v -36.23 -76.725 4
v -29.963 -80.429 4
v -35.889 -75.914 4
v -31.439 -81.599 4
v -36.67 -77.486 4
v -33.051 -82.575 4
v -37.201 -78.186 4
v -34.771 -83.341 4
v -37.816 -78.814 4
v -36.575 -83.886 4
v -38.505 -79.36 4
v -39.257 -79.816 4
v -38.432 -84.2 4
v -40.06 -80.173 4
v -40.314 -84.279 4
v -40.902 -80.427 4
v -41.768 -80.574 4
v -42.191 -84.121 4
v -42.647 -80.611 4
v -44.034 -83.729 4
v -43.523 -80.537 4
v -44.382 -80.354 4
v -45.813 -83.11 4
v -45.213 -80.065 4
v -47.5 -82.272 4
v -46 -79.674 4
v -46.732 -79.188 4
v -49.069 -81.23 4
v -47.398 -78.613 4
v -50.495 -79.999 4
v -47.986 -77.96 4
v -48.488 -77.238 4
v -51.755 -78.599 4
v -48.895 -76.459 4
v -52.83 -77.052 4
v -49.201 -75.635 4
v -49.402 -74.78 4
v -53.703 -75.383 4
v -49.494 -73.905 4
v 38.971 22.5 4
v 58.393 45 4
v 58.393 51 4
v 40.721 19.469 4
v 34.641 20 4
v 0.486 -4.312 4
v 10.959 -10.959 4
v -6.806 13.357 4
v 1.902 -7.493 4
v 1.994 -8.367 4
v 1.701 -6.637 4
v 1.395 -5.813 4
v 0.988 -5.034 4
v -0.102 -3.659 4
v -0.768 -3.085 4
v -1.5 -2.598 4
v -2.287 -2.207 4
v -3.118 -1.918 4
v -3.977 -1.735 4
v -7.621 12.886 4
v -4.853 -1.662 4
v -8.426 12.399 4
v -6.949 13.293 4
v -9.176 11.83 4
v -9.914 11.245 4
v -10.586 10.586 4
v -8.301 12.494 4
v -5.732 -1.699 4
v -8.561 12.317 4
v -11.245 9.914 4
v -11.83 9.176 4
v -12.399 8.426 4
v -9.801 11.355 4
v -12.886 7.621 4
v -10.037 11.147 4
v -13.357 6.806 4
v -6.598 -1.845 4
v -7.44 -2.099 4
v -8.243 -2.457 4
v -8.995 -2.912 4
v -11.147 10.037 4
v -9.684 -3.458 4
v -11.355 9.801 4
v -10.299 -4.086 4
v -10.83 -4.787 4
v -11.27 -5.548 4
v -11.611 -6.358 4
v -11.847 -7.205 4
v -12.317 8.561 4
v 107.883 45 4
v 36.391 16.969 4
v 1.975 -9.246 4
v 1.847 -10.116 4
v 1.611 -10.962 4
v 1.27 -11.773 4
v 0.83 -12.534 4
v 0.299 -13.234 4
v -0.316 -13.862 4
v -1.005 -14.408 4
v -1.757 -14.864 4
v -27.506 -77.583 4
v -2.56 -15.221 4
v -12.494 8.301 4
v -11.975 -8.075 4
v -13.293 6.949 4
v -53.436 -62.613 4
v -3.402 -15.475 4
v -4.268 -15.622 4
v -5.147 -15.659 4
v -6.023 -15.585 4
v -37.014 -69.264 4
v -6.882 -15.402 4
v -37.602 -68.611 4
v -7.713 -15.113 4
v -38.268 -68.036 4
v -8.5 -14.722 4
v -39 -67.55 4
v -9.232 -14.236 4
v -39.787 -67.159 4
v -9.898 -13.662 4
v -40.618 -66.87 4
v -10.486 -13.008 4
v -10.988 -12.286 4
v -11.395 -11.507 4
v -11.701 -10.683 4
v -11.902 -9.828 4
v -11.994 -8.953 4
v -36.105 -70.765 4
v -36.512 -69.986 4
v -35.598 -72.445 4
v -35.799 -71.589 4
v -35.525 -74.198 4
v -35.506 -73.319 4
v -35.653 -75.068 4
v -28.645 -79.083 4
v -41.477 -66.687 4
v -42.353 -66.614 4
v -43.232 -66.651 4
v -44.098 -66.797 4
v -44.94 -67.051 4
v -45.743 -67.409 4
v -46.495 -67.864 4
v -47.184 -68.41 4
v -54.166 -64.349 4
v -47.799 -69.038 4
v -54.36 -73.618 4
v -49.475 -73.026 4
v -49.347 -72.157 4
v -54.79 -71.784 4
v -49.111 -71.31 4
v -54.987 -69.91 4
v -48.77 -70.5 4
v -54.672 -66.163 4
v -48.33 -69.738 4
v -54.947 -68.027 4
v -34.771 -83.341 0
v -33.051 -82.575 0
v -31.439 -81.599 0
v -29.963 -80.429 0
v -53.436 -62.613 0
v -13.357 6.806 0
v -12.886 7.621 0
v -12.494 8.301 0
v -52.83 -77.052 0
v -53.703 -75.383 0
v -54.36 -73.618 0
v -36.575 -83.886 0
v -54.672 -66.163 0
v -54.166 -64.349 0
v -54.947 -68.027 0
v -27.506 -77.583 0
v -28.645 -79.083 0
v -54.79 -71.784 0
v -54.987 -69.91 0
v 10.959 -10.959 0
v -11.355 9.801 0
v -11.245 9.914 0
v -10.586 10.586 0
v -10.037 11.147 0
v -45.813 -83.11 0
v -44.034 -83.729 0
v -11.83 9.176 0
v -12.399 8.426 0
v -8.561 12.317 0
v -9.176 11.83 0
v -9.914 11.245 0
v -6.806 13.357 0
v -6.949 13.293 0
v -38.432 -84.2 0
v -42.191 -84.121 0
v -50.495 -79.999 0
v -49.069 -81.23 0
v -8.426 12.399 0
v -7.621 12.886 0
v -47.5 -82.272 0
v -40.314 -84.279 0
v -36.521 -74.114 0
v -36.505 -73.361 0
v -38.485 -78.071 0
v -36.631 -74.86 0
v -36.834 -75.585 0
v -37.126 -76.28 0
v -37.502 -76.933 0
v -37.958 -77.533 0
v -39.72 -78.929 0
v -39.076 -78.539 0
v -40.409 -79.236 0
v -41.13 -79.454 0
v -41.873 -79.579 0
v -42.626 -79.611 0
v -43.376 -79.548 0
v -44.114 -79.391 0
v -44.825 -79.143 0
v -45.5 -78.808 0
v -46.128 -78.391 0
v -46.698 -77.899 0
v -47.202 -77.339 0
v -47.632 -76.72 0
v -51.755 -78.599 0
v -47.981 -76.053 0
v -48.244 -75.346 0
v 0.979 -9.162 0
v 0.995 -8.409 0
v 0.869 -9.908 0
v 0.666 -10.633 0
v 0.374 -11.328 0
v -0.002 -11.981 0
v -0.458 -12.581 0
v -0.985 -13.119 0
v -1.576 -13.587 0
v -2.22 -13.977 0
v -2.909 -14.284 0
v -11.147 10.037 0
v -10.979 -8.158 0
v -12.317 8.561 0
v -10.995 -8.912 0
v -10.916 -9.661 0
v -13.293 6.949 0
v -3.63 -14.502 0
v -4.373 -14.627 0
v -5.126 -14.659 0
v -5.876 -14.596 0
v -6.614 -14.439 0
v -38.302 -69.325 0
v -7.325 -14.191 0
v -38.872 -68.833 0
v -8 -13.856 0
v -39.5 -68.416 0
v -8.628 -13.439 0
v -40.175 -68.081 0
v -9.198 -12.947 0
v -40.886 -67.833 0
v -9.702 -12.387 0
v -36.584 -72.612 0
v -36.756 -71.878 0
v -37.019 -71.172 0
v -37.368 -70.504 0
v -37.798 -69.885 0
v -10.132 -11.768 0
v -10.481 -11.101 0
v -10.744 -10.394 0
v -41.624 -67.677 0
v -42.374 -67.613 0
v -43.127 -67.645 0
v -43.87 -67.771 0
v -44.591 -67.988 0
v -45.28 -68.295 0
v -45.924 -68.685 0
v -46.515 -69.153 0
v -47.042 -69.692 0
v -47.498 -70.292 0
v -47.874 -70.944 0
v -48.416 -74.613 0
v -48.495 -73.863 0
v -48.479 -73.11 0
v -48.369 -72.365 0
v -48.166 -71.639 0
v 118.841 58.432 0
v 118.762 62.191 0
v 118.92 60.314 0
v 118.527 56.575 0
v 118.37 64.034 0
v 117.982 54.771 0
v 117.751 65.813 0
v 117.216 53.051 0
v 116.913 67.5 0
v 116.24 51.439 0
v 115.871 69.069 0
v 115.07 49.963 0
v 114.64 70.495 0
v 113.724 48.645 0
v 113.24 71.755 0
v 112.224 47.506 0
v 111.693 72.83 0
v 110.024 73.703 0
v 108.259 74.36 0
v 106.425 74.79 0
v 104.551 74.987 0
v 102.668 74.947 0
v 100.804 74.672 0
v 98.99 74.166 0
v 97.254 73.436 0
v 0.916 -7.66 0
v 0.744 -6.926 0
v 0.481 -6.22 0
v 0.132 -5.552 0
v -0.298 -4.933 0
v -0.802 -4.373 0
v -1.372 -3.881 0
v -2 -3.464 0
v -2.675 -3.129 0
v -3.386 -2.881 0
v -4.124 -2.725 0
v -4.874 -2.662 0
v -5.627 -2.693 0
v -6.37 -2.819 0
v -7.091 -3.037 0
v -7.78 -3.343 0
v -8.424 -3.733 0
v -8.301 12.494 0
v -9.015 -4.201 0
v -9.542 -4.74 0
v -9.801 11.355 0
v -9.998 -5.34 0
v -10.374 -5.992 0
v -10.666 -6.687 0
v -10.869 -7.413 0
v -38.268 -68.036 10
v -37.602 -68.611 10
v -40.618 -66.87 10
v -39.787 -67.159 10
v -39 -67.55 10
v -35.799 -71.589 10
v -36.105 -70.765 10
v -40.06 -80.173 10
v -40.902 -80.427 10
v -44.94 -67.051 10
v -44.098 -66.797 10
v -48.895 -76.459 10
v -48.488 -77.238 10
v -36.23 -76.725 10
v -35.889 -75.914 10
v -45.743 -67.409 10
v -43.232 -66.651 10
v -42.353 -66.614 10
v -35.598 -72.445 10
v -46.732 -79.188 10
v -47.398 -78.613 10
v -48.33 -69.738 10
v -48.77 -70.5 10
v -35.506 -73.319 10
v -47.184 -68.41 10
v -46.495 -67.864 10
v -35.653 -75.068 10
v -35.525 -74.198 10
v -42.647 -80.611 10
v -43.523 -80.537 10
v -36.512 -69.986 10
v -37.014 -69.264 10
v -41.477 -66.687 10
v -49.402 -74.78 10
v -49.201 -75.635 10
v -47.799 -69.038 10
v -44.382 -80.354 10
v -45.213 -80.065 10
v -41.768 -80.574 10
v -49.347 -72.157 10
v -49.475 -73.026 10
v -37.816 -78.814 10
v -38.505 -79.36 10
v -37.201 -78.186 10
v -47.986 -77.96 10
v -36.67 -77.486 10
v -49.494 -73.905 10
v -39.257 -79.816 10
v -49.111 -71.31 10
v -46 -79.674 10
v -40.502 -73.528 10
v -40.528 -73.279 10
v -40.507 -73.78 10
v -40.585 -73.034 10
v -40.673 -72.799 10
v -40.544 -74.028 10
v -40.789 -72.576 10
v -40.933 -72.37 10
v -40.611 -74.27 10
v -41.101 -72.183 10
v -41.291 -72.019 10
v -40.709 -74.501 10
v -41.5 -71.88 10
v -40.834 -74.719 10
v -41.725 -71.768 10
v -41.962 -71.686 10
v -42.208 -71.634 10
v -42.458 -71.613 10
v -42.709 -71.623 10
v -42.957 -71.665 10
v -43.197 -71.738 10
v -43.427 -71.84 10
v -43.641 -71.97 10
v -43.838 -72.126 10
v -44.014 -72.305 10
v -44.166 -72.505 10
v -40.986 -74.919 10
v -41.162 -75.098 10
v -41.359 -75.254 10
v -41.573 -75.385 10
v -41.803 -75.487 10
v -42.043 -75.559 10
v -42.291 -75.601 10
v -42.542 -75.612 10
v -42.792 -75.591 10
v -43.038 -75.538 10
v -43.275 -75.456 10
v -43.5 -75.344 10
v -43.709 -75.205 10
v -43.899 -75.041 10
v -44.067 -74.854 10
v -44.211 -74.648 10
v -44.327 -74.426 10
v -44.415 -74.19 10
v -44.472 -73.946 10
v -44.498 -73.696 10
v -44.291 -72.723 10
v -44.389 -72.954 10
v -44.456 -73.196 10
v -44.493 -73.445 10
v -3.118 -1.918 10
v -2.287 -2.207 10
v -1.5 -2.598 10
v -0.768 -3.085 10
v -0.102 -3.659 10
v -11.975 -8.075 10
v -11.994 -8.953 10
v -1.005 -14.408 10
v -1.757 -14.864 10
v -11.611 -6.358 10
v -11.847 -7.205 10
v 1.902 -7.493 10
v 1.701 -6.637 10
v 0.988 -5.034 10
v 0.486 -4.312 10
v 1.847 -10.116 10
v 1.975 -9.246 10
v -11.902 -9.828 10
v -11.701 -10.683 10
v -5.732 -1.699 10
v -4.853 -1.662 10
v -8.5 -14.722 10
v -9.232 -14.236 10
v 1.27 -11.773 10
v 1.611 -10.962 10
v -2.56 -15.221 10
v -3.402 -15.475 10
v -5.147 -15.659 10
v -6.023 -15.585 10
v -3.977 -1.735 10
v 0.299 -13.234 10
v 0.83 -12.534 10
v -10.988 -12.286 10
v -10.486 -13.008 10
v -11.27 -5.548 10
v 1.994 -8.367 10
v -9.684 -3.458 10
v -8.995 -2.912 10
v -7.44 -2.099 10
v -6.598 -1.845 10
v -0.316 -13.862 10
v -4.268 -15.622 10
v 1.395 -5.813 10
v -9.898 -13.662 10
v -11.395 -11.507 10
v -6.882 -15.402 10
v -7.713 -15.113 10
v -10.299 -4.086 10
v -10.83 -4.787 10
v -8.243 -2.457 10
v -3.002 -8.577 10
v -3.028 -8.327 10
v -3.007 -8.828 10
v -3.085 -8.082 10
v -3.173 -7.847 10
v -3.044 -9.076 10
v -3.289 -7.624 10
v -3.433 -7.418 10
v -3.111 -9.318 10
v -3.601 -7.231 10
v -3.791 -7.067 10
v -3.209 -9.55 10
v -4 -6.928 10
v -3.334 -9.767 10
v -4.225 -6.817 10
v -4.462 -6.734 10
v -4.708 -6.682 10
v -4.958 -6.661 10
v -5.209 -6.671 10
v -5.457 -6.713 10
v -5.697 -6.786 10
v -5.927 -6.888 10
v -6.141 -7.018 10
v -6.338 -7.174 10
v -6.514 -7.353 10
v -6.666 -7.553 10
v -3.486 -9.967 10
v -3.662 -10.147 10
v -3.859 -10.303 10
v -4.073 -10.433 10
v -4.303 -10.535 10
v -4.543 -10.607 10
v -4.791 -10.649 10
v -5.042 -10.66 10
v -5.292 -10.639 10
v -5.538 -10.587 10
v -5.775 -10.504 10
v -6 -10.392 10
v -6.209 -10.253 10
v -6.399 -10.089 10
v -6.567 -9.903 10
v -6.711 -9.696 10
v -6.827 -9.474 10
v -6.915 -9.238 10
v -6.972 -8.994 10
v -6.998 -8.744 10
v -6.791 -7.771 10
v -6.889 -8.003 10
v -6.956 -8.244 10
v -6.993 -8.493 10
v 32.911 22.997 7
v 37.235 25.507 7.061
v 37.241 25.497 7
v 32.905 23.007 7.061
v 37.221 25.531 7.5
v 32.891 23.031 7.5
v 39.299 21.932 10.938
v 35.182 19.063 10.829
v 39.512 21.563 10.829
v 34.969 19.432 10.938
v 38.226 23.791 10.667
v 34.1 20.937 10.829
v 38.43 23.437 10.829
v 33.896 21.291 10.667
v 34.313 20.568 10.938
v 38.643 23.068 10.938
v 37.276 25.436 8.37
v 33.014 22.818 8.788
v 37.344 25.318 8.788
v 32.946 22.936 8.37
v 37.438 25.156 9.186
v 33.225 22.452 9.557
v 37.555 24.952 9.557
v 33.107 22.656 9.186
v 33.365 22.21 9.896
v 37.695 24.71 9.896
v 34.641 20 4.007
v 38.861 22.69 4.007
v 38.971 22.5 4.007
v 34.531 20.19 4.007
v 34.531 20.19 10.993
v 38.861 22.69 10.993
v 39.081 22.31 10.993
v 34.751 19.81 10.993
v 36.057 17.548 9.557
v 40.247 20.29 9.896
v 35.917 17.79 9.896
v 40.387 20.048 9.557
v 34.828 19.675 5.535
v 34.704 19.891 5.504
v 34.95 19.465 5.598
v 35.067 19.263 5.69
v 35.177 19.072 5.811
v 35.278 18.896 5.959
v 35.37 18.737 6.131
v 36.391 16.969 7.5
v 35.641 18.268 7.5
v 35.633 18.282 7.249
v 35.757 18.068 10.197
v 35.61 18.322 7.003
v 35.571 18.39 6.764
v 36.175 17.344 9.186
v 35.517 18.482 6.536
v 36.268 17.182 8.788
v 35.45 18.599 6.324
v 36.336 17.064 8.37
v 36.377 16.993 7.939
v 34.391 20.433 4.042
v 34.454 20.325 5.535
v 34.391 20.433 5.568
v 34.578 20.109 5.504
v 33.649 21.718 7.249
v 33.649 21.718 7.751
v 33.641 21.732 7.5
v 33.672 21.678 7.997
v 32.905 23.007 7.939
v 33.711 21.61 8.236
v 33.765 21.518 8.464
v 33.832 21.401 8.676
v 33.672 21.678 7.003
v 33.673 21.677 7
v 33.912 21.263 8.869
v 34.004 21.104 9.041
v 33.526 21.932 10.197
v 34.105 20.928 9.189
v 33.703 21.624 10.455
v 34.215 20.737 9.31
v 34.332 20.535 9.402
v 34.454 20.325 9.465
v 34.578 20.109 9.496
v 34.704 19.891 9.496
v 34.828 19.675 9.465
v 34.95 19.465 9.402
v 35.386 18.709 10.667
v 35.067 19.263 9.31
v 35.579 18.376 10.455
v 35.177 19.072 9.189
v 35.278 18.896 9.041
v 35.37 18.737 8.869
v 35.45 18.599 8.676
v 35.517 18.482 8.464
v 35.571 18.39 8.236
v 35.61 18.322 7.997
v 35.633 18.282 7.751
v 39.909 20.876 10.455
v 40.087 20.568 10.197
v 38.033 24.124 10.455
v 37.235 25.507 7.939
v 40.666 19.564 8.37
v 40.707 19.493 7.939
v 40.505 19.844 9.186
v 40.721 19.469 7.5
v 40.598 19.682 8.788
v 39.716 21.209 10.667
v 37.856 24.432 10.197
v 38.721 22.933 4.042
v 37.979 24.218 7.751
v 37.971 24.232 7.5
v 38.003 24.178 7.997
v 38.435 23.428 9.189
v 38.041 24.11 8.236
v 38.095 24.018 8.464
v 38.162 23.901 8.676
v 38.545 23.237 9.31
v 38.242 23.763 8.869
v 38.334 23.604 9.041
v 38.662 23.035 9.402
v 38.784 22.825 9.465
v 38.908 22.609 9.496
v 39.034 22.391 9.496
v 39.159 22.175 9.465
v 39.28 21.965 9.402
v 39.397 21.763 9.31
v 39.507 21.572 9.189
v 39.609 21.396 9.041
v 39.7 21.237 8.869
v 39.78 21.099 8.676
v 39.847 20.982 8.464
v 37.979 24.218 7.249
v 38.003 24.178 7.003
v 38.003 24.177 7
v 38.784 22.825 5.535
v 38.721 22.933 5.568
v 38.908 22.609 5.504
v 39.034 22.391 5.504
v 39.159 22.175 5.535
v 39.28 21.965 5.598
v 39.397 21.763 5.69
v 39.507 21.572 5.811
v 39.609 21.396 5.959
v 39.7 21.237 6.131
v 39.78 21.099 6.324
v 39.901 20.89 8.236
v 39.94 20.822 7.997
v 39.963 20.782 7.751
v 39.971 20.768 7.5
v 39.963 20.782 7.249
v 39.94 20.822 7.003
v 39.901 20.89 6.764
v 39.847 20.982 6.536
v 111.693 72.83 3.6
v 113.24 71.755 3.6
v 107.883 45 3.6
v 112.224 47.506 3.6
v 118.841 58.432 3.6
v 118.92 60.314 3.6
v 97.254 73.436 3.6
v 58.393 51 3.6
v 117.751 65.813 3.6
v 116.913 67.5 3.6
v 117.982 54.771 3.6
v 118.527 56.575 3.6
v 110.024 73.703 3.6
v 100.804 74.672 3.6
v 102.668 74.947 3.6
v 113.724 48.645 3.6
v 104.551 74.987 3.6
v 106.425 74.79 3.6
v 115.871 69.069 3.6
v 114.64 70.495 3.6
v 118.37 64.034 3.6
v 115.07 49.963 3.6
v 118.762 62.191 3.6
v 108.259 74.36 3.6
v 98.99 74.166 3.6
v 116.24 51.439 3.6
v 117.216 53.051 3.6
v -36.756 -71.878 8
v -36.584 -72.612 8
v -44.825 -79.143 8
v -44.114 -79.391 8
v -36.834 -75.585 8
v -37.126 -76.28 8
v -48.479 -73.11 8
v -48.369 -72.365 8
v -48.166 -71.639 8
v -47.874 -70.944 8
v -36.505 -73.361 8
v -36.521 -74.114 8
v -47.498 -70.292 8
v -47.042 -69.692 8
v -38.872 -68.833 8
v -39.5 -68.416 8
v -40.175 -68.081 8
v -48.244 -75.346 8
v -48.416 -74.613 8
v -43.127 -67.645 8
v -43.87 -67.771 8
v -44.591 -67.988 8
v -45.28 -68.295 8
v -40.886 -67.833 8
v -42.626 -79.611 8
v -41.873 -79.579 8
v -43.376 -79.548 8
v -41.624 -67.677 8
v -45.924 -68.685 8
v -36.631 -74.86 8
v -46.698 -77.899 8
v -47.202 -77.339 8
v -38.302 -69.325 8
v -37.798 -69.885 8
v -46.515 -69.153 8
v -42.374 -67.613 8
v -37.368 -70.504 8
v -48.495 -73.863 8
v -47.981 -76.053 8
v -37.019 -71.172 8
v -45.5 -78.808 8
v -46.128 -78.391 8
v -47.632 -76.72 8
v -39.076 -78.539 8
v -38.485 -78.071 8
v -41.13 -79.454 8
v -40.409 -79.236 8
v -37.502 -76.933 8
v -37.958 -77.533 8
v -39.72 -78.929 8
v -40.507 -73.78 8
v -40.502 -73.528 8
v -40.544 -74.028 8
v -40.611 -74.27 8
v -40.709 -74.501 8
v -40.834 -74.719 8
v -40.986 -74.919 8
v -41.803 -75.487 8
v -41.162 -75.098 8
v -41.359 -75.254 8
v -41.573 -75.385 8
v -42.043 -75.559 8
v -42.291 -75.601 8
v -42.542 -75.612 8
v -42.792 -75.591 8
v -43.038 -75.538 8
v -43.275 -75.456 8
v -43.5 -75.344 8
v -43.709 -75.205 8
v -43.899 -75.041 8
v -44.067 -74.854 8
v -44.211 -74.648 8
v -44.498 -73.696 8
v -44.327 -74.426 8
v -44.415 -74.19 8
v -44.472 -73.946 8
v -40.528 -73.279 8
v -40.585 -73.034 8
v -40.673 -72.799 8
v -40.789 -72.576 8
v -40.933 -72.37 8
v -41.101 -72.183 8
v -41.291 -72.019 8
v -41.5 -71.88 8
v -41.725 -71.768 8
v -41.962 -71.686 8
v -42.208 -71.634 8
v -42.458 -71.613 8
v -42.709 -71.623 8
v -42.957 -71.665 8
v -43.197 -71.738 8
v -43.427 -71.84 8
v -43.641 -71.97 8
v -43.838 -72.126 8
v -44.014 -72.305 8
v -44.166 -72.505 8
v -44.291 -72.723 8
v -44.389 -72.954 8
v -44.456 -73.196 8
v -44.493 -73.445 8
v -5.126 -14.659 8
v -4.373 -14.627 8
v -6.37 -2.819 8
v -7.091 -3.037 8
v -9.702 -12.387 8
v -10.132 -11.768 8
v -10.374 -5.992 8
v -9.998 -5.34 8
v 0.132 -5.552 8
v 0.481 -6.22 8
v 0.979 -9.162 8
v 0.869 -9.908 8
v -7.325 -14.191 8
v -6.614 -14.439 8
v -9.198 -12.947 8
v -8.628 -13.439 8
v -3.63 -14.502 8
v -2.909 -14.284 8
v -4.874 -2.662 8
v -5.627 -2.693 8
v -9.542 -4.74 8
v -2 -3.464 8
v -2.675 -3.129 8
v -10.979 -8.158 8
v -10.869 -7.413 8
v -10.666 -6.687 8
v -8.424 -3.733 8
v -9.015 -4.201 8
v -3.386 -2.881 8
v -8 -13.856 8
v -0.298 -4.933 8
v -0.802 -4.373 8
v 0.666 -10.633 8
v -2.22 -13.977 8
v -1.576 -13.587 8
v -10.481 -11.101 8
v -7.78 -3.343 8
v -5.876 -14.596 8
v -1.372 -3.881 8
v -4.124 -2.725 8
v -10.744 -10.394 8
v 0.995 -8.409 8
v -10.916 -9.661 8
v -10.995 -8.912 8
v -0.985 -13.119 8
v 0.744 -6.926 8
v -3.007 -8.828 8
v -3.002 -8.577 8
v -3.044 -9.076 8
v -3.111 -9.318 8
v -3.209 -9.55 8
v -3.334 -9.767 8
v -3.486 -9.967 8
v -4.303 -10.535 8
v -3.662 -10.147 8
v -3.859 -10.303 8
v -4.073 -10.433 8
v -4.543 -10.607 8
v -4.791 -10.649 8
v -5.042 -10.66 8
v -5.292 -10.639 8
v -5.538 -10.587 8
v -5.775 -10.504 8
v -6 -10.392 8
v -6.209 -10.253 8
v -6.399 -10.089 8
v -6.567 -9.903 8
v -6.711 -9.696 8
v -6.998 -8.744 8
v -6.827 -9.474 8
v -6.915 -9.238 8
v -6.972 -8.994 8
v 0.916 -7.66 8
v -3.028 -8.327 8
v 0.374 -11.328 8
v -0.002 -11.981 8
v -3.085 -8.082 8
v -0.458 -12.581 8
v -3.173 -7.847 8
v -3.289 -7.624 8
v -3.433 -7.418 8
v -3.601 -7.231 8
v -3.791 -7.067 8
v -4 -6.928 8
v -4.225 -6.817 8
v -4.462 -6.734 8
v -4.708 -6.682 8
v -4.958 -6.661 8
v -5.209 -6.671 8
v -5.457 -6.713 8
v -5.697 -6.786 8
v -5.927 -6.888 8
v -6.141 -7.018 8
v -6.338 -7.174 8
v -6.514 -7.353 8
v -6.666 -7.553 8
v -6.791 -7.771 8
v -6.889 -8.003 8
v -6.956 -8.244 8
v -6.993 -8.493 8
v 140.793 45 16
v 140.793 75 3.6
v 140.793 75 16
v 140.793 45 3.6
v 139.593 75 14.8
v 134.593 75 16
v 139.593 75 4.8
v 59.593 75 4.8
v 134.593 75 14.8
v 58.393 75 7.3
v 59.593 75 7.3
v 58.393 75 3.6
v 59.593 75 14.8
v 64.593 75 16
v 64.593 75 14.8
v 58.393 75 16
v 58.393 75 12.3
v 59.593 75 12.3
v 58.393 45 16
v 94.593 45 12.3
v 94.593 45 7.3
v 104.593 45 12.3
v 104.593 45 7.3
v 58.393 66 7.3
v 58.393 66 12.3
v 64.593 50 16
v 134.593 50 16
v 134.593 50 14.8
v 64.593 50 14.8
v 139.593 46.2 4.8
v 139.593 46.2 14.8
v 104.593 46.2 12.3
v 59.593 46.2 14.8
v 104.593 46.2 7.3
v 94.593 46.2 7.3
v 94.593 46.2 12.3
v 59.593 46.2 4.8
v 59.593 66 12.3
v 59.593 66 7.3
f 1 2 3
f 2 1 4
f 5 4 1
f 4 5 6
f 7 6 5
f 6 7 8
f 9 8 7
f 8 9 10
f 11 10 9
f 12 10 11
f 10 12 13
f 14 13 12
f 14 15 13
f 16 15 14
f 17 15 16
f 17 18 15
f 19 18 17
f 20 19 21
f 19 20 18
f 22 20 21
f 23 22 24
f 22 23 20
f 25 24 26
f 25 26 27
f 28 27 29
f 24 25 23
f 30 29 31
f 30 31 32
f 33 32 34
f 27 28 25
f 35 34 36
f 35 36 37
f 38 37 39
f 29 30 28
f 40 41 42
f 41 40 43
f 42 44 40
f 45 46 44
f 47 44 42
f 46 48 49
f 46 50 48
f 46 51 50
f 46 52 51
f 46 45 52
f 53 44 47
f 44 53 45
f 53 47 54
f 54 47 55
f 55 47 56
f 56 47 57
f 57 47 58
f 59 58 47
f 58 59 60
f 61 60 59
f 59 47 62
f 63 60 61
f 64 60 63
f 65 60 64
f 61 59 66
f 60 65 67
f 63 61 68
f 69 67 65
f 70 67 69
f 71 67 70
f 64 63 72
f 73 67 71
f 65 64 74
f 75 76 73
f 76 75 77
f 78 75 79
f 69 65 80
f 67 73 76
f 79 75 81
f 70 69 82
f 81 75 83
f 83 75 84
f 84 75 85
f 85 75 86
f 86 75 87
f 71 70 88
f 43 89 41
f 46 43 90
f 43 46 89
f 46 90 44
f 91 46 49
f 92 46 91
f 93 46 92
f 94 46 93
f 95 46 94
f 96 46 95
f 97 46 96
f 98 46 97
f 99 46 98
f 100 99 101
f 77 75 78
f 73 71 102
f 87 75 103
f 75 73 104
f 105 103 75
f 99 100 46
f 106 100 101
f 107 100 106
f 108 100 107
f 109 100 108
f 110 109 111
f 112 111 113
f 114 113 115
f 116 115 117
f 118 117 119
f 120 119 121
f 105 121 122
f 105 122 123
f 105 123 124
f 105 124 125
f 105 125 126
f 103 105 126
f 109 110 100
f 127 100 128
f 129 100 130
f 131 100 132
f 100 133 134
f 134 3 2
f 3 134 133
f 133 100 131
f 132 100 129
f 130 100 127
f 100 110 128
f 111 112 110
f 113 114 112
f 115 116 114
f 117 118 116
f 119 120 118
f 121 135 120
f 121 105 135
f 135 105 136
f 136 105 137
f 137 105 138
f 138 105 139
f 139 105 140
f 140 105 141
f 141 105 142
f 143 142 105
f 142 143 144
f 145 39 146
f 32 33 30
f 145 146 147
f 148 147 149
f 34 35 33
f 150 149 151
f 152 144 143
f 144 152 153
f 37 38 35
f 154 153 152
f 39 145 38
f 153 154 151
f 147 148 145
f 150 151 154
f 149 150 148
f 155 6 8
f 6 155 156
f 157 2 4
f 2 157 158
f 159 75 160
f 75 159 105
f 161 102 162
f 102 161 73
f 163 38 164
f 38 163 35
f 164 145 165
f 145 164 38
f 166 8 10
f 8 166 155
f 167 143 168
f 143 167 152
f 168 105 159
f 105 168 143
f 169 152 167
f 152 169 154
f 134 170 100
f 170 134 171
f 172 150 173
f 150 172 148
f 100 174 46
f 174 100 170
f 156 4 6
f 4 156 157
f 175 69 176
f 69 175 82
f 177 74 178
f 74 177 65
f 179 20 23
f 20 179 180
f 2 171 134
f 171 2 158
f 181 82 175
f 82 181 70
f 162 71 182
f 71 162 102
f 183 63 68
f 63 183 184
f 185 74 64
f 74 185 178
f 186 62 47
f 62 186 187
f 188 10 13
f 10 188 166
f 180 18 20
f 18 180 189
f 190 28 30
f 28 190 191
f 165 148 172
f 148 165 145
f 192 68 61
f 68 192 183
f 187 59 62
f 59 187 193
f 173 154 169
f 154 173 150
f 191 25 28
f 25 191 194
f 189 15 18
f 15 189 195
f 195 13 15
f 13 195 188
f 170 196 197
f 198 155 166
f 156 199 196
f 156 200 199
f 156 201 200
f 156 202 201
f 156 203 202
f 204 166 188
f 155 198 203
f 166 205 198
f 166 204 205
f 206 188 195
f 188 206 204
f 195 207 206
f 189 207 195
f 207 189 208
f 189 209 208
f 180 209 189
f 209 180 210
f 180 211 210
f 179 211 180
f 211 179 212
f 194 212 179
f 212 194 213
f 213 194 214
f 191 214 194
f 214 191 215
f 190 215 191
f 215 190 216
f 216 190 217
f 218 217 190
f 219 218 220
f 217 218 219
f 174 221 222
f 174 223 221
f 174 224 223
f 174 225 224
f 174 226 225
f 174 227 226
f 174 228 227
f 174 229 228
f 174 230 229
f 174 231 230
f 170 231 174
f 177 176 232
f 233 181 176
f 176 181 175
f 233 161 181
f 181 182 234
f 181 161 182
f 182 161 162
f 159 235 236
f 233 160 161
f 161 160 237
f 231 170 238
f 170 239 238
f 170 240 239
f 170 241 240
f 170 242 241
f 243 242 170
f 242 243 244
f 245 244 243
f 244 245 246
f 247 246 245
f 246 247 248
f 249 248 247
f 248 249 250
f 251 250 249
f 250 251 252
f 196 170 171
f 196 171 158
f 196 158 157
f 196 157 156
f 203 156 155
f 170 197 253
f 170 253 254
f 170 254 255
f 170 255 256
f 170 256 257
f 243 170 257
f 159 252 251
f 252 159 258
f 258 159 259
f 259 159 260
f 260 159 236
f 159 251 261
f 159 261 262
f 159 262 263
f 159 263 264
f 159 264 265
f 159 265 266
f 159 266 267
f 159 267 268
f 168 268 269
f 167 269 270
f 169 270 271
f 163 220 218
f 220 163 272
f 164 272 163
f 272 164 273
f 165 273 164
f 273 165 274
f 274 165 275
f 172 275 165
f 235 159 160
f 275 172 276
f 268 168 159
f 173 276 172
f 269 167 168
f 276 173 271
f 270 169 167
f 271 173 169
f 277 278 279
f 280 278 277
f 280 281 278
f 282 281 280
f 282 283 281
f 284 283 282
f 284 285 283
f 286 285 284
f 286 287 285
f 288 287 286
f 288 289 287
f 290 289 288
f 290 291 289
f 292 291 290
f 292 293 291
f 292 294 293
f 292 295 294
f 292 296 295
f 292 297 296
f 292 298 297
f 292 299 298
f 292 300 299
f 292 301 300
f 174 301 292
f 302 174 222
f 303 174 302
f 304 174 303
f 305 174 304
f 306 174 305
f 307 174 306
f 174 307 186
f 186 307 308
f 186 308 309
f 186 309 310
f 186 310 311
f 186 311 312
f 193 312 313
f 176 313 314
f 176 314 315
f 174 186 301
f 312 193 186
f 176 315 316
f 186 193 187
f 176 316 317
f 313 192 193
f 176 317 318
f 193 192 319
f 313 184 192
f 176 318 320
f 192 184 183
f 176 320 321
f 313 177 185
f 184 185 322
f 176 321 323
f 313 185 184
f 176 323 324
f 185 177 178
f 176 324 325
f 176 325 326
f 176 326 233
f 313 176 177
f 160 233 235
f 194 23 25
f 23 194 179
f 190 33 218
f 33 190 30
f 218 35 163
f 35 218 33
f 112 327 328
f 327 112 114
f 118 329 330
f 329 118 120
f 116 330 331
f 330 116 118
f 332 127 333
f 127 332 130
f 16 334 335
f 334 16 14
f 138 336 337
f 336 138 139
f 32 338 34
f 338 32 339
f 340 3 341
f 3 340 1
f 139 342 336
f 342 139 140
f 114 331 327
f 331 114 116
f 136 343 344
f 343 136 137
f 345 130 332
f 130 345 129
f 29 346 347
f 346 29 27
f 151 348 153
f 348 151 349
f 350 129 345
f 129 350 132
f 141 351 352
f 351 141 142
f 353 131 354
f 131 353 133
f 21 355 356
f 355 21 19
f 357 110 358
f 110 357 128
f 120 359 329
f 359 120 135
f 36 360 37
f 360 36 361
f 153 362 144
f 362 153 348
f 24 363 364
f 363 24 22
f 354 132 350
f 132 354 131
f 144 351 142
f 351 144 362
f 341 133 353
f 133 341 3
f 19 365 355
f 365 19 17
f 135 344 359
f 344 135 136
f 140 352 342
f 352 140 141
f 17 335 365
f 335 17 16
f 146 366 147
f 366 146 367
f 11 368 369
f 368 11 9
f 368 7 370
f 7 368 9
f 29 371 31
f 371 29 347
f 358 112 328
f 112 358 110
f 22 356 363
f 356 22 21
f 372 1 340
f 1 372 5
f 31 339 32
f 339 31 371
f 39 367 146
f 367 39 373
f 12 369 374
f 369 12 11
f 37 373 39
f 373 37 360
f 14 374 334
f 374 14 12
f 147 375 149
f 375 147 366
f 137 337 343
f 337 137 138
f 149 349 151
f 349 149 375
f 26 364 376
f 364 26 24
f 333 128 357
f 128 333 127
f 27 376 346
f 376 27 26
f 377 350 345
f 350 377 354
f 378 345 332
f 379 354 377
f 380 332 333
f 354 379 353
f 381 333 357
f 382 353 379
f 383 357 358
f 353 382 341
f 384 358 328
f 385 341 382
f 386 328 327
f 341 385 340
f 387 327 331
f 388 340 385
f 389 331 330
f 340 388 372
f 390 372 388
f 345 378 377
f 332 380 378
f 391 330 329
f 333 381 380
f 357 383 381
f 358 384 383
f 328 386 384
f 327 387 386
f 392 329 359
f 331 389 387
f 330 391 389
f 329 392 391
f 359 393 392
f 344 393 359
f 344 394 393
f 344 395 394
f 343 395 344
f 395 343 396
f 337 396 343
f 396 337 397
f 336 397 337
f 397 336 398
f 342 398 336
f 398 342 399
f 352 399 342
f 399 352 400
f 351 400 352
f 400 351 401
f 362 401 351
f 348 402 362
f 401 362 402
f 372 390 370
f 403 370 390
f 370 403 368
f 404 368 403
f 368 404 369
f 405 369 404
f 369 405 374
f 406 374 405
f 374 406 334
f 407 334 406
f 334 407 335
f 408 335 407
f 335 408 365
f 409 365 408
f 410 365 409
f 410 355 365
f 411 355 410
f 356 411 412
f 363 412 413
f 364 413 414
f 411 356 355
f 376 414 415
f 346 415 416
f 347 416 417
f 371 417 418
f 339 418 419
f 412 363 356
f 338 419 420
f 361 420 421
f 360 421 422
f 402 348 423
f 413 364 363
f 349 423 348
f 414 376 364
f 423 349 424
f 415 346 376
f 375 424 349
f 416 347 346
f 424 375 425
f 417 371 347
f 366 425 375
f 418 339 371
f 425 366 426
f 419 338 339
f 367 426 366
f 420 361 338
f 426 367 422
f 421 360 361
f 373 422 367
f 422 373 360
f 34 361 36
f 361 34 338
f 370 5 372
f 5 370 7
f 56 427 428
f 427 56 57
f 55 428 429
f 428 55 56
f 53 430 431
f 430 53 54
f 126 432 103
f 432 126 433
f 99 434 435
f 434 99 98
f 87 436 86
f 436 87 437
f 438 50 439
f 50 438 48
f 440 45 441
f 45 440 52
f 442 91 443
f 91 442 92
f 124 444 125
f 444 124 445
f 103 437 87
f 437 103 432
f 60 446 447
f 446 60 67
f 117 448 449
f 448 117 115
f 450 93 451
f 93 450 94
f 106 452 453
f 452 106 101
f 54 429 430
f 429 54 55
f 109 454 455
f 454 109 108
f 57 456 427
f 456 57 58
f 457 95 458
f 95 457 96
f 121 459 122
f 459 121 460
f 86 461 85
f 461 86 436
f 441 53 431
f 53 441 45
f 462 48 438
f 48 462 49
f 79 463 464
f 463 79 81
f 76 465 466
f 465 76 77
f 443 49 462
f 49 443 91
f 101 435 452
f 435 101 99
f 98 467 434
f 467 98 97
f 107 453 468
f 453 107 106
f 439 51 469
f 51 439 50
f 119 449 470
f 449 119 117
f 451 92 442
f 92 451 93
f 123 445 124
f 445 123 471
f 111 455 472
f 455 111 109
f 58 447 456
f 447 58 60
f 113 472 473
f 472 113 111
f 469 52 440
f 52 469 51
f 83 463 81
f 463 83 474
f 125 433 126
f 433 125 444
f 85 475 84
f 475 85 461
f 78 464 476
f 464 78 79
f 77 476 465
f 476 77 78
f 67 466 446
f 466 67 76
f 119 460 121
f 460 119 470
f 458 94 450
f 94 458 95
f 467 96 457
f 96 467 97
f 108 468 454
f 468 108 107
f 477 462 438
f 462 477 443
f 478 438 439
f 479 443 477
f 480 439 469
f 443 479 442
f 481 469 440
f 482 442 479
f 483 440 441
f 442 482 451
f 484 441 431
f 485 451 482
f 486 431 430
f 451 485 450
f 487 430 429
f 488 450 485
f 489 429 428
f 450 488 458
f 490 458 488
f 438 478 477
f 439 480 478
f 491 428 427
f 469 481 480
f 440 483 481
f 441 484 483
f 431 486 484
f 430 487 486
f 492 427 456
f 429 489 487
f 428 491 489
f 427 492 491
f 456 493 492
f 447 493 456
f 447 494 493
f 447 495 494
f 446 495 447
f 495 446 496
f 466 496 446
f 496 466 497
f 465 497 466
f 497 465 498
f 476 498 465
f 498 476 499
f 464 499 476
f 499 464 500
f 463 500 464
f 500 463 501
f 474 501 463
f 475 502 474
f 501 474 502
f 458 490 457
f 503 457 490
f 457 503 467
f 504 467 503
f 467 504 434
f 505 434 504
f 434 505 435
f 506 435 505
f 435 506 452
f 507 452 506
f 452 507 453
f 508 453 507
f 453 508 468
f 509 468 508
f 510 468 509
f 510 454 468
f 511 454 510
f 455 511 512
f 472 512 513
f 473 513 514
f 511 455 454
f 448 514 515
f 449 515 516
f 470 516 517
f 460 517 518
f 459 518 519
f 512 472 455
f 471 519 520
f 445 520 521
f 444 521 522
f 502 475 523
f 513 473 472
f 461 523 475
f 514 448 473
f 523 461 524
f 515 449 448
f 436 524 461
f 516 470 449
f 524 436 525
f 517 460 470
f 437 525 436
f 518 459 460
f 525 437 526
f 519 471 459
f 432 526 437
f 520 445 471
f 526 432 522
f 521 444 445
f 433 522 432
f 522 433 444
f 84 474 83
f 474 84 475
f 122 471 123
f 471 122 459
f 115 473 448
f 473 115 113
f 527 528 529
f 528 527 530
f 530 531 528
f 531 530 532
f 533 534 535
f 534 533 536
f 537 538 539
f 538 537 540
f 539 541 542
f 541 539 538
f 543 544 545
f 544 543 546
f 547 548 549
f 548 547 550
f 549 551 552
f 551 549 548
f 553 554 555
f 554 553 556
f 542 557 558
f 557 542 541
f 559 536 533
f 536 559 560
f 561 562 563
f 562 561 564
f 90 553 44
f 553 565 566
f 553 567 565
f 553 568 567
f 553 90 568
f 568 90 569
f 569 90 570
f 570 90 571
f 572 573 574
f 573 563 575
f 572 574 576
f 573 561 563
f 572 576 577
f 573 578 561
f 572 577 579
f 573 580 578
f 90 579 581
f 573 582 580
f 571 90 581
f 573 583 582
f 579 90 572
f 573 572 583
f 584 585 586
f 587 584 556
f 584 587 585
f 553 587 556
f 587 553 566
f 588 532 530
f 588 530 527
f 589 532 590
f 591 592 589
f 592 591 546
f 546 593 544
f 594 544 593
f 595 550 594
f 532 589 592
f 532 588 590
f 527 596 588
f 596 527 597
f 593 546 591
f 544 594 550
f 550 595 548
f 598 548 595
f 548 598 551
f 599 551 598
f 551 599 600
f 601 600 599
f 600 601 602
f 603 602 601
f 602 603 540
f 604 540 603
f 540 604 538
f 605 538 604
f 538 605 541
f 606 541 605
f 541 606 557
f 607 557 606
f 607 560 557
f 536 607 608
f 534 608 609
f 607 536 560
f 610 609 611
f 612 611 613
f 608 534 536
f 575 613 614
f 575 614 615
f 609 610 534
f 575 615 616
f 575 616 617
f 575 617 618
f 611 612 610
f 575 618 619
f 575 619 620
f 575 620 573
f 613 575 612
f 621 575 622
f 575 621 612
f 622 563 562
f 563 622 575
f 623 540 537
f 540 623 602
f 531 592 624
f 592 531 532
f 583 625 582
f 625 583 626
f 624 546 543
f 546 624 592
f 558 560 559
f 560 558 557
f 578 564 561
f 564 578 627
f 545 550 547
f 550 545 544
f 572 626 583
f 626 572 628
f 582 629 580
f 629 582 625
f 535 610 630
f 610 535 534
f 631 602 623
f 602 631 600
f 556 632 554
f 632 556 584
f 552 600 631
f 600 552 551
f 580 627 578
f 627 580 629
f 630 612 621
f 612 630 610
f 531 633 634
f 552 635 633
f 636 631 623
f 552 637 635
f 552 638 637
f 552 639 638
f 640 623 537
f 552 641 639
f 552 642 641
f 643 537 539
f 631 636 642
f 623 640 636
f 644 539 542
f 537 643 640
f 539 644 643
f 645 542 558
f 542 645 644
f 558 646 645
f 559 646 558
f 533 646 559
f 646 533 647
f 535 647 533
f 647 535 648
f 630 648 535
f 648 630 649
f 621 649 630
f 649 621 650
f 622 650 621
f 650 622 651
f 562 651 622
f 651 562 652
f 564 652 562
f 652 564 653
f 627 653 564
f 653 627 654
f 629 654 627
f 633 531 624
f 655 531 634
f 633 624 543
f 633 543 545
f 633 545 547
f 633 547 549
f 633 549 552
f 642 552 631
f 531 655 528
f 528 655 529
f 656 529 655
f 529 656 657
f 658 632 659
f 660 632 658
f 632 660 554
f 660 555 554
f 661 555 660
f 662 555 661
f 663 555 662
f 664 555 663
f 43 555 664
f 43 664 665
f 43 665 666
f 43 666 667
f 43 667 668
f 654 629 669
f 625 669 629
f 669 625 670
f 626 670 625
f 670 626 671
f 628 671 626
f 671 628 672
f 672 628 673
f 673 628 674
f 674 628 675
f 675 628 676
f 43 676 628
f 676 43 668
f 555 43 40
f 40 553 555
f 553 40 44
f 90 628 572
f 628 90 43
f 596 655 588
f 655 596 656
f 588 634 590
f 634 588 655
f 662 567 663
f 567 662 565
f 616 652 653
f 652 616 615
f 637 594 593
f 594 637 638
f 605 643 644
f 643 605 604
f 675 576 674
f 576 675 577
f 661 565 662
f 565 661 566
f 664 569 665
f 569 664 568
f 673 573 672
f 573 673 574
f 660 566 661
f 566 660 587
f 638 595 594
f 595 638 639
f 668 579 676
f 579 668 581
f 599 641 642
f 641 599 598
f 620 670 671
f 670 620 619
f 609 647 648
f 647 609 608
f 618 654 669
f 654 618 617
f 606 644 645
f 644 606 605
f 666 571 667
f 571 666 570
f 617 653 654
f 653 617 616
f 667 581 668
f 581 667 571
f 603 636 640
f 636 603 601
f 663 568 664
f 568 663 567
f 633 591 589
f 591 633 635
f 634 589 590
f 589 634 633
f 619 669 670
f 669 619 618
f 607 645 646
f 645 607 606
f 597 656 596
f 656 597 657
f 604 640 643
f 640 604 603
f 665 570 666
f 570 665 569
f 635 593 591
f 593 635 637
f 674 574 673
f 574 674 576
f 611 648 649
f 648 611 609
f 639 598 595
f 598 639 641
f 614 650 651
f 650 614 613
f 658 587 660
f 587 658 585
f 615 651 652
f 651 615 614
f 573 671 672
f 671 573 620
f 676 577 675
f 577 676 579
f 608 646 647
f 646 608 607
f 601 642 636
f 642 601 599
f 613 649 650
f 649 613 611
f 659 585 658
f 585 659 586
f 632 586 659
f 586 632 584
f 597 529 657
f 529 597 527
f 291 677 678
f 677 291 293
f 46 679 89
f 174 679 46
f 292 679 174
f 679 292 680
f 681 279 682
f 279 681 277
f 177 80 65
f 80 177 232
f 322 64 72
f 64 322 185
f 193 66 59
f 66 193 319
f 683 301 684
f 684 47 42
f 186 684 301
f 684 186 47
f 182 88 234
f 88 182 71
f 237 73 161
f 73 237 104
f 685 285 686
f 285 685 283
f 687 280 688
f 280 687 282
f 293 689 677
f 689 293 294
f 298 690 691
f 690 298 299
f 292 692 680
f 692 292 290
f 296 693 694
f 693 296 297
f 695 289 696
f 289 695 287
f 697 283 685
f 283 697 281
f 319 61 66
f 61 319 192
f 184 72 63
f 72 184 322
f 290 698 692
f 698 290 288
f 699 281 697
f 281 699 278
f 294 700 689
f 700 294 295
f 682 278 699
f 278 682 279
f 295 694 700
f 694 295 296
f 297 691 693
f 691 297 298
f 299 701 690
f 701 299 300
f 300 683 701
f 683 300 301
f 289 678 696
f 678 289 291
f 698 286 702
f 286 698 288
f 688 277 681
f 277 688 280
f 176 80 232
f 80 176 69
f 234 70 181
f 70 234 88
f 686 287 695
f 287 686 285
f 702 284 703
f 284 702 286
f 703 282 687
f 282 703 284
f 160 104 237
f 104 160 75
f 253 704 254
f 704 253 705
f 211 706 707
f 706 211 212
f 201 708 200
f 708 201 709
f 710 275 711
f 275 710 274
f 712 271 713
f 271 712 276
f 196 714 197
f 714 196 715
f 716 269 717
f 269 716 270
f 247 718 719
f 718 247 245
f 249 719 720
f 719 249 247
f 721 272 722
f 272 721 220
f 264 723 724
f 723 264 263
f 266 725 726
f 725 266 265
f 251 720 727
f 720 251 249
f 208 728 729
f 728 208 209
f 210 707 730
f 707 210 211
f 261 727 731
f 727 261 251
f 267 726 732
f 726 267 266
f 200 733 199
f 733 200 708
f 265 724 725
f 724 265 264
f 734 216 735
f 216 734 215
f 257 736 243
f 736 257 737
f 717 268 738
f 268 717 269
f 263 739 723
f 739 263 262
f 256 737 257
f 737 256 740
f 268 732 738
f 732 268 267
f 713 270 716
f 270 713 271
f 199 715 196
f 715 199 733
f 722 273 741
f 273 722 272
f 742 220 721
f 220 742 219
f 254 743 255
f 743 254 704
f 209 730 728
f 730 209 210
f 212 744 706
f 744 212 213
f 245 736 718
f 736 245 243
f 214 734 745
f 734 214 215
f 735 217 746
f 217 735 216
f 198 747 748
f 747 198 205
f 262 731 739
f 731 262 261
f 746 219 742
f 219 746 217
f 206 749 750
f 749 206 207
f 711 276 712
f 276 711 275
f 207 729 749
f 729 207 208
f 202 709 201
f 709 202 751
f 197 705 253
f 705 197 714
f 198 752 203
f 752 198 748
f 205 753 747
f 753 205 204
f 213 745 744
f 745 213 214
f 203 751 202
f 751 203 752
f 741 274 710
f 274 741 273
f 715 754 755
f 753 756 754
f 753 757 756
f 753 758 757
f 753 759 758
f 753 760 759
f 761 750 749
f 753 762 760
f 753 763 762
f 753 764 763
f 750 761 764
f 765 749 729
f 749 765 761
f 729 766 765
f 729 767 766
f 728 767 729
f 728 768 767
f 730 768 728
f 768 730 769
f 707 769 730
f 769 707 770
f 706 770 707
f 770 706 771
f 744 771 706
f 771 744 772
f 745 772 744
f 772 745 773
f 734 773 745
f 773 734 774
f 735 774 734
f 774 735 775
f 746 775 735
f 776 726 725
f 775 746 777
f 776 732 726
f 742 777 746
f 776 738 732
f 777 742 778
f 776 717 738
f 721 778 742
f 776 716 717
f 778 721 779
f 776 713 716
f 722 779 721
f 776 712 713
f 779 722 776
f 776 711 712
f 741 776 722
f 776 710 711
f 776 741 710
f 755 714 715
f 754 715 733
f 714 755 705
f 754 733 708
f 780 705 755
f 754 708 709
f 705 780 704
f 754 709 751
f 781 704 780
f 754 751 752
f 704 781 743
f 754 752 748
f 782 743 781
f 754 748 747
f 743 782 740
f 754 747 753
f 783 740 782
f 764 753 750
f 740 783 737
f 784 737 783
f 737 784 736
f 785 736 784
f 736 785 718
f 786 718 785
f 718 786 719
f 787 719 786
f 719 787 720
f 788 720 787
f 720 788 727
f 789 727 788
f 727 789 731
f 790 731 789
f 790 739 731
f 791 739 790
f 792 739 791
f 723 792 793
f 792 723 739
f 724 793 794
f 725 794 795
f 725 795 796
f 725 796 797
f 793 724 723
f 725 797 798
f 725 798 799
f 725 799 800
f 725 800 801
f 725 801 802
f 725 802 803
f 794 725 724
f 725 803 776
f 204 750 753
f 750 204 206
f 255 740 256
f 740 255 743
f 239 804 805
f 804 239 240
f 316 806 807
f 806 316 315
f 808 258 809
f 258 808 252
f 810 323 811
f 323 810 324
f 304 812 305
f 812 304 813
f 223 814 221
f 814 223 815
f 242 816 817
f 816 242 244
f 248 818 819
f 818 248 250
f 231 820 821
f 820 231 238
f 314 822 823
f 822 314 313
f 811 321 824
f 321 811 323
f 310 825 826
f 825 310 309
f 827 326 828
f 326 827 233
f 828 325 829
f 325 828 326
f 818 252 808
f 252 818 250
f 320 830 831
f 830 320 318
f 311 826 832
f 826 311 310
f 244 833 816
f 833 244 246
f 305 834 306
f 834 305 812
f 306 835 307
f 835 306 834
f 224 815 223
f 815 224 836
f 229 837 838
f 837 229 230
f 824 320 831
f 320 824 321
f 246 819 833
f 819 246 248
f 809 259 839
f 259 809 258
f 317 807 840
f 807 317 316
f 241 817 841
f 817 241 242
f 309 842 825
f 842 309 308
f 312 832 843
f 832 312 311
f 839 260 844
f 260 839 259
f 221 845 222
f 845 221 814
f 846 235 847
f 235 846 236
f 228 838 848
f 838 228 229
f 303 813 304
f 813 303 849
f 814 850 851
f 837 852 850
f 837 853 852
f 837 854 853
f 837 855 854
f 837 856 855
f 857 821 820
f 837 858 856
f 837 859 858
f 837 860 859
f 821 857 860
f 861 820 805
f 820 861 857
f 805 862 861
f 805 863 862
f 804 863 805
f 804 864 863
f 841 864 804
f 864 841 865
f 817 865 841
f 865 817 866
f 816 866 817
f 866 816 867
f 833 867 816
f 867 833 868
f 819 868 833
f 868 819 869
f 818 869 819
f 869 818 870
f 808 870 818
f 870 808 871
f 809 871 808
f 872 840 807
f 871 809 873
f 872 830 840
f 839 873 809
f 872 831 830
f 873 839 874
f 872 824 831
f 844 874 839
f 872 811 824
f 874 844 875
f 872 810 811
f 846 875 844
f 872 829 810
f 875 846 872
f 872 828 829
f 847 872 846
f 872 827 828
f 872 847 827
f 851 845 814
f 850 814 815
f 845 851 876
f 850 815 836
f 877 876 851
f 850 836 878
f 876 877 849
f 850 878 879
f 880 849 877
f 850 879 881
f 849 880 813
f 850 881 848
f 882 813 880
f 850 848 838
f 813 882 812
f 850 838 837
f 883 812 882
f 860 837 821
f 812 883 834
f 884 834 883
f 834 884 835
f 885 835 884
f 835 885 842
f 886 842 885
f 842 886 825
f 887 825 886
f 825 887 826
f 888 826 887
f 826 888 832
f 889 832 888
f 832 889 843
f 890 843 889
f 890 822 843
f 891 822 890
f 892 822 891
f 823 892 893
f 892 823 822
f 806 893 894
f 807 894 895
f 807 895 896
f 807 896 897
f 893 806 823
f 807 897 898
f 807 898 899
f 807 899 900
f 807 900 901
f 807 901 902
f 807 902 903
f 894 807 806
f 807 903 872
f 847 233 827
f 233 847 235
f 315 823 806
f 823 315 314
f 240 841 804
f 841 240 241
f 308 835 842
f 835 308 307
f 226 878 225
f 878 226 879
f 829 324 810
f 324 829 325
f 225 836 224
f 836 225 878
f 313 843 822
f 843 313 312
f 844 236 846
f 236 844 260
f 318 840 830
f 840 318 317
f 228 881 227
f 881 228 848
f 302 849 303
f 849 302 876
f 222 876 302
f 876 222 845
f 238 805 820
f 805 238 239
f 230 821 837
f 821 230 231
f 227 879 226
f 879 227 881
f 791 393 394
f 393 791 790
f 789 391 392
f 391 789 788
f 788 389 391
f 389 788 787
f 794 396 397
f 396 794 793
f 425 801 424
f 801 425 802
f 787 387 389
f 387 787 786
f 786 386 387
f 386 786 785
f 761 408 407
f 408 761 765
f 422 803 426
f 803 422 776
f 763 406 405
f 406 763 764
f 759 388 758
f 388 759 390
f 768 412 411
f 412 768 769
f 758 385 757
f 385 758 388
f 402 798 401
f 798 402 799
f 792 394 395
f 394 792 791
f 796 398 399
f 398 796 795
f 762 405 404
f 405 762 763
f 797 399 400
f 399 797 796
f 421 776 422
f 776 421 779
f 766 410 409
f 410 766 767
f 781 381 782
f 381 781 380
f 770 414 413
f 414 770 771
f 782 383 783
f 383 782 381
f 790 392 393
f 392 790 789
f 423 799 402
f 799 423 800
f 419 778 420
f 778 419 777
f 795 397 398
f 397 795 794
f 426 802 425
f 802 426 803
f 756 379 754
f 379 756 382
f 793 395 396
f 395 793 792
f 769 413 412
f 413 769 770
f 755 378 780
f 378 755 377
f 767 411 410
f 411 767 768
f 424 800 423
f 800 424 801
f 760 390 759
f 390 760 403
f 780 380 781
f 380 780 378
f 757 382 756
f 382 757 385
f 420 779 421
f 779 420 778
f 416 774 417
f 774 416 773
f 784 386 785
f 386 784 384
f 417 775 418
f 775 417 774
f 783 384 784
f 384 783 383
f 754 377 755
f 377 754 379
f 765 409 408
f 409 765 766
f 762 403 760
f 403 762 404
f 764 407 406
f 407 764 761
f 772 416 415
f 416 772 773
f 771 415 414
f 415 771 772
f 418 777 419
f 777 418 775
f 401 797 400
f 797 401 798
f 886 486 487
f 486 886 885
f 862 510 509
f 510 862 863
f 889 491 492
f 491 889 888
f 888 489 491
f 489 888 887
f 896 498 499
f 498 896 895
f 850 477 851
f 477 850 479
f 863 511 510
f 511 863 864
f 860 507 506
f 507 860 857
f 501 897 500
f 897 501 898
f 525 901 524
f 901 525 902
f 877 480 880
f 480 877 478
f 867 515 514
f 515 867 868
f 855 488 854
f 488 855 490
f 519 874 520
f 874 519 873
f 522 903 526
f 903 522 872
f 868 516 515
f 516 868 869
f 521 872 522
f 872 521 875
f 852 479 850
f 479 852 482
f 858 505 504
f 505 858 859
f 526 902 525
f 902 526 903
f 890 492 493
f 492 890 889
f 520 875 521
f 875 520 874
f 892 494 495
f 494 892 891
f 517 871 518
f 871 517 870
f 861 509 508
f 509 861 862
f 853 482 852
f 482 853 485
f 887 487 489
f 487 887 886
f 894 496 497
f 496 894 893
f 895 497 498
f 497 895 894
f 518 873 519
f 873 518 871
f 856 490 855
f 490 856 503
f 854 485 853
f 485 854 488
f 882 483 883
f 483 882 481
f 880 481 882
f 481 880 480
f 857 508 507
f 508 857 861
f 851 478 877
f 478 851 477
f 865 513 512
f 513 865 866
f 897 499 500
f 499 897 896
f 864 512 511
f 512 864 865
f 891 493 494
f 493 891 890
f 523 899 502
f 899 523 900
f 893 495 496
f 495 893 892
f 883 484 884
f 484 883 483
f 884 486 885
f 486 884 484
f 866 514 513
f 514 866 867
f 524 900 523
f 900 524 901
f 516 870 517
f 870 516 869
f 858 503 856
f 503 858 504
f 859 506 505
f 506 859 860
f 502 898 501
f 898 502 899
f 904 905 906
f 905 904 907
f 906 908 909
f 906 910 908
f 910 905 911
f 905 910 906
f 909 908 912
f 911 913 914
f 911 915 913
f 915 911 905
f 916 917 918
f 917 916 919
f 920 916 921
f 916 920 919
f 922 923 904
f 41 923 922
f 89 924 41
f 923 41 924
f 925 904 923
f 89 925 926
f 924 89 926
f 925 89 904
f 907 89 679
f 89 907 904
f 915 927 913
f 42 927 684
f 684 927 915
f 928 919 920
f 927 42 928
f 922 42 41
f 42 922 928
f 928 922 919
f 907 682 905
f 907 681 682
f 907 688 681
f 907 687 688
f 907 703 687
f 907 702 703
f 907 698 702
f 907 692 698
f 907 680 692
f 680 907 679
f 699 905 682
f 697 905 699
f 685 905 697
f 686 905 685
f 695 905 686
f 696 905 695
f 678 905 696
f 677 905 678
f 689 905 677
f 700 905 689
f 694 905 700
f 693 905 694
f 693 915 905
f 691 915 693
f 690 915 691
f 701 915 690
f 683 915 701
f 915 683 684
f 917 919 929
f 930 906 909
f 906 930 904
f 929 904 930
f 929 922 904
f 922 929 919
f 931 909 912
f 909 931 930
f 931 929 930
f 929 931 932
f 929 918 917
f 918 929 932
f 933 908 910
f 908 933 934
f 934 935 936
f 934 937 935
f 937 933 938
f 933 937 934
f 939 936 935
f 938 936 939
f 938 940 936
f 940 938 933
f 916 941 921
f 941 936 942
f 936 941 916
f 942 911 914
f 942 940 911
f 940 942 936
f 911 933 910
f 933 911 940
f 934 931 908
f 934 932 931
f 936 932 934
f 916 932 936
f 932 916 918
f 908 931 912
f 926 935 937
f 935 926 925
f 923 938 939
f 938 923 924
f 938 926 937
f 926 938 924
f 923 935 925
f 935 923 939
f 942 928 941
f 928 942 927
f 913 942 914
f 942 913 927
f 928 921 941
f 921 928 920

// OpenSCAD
/* [Support] */
// Length of the mount arm. Longer arms will produce more vibrations.
armLenght = 135; // [120:170]

// Mount direction
mountDir = 1; // [1:To the right, -1:To the left]
// Angle between arms. Best suit for me was 30º
armsAngle = 30; // [0:90]

// Include cable holder
cableHolder = 1; // [0:No, 1:Yes]

// Cable diameter
cableDiameter = 4; // [1:10]

// Separation between cable holder and mount support
holderSeparation = 90; //[10:150]

/* [Mount] */

// Phone width
phoneW = 80;

// Phone depth
phoneD = 10;

// Mount height
mountH = 30;

// USB plug width
usbW = 10;

// USB plug depth
usbD = 5;

/* [Hidden] */
width=30;
height=4;
corner=10;
len1=armLenght;
len2=95;


mountH1 = 5;

rad1=6;
rad2=7;
rad3=2;
h1=6;
h2=2;

// Separation between drills
dist1=75;

// Distance to end from mount base
dist2=10;
dist3=holderSeparation;
$fn=50;

ang=armsAngle*mountDir;

cR=1.5;
cabRad=cableDiameter/2;
cabLen=5;

rotate(a=[0, 0, (mountDir == 1 ? 0 : 180) + mountDir*30]) carMount();
translate([mountDir*cos(60-armsAngle)*(len1-phoneW/4), sin(60-armsAngle)*(len1-mountH*3/2), height+phoneD+2]) rotate(a=[-90, 0, 0]) mount();
module carMount() {
difference() {
union() {
sideA();
rotate(a=[0, 0, ang]) translate([-len2+width/2, 0, 0]) sideB();
    if (cableHolder==1) translate([len1-dist3, 0, height]) cableHolder();
}
rotate(a=[0, 0, ang]) translate([-len2+width/2, 0, 0]) drills();
}
}

module cableHolder() {
    translate([0, 0, cabRad+cR]) rotate(a=[90, -180, -mountDir*90])
    difference() {
        union() {
    cylinder(r=cabRad+cR, h=cabLen);
    translate([-cabRad-cR, 0, 0]) cube([cabRad+cR, cabRad+cR, cabLen]);
        }
    translate([0, 0, -1]){ cylinder(r=cabRad, h=cabLen+2);
    translate([0.5, 0.5, 0]) cube([cabRad+cR, cabRad+cR, cabLen+2]);}}
}

module sideA() {
hull() {
    cylinder(r=width/2, h=height);
    translate([len1-width/2, 0, 0]) cylinder(r=width/2, h=height);
}    
}

module sideB() {
    hull() {
    cylinder(r=width/2, h=height);
    translate([(len2-width/2), 0, 0]) cylinder(r=width/2, h=height);
    }
    translate([-(width/2-10), 0, height]) cylinder(r=rad2, h=h1);
    translate([-(width/2-10)+dist1, 0, height]) cylinder(r=rad2, h=h1);
}

module drills() {
    translate([-(width/2-10), 0, -1]) cylinder(r=rad1, h=height+h1-h2+1);
    translate([-(width/2-10)+dist1, 0, -1]) cylinder(r=rad1, h=height+h1-h2+1);
    translate([-(width/2-10), 0, 0]) cylinder(r=rad3, h=height+h1+1);
    translate([-(width/2-10)+dist1, 0, 0]) cylinder(r=rad3, h=height+h1+1);
}

module mount() {
    wT = 1.2;
    difference() {
        translate([-phoneW/2-wT, 0, 0]) cube([phoneW+2*wT, phoneD+2*wT, mountH]);
        translate([-phoneW/2+mountH1, -phoneD, mountH1]) cube([phoneW-mountH1*2, phoneD*2, mountH]); 
        translate([-phoneW/2, wT, wT]) cube([phoneW, phoneD, mountH+1]);
        translate([0, phoneD/2+wT, 0]) cube([usbW, usbD, wT*3], center=true);
        translate([-phoneW/2, phoneD/2+wT, mountH-usbW/2+1]) cube([wT*3, usbD, usbW], center=true);
    }
}
